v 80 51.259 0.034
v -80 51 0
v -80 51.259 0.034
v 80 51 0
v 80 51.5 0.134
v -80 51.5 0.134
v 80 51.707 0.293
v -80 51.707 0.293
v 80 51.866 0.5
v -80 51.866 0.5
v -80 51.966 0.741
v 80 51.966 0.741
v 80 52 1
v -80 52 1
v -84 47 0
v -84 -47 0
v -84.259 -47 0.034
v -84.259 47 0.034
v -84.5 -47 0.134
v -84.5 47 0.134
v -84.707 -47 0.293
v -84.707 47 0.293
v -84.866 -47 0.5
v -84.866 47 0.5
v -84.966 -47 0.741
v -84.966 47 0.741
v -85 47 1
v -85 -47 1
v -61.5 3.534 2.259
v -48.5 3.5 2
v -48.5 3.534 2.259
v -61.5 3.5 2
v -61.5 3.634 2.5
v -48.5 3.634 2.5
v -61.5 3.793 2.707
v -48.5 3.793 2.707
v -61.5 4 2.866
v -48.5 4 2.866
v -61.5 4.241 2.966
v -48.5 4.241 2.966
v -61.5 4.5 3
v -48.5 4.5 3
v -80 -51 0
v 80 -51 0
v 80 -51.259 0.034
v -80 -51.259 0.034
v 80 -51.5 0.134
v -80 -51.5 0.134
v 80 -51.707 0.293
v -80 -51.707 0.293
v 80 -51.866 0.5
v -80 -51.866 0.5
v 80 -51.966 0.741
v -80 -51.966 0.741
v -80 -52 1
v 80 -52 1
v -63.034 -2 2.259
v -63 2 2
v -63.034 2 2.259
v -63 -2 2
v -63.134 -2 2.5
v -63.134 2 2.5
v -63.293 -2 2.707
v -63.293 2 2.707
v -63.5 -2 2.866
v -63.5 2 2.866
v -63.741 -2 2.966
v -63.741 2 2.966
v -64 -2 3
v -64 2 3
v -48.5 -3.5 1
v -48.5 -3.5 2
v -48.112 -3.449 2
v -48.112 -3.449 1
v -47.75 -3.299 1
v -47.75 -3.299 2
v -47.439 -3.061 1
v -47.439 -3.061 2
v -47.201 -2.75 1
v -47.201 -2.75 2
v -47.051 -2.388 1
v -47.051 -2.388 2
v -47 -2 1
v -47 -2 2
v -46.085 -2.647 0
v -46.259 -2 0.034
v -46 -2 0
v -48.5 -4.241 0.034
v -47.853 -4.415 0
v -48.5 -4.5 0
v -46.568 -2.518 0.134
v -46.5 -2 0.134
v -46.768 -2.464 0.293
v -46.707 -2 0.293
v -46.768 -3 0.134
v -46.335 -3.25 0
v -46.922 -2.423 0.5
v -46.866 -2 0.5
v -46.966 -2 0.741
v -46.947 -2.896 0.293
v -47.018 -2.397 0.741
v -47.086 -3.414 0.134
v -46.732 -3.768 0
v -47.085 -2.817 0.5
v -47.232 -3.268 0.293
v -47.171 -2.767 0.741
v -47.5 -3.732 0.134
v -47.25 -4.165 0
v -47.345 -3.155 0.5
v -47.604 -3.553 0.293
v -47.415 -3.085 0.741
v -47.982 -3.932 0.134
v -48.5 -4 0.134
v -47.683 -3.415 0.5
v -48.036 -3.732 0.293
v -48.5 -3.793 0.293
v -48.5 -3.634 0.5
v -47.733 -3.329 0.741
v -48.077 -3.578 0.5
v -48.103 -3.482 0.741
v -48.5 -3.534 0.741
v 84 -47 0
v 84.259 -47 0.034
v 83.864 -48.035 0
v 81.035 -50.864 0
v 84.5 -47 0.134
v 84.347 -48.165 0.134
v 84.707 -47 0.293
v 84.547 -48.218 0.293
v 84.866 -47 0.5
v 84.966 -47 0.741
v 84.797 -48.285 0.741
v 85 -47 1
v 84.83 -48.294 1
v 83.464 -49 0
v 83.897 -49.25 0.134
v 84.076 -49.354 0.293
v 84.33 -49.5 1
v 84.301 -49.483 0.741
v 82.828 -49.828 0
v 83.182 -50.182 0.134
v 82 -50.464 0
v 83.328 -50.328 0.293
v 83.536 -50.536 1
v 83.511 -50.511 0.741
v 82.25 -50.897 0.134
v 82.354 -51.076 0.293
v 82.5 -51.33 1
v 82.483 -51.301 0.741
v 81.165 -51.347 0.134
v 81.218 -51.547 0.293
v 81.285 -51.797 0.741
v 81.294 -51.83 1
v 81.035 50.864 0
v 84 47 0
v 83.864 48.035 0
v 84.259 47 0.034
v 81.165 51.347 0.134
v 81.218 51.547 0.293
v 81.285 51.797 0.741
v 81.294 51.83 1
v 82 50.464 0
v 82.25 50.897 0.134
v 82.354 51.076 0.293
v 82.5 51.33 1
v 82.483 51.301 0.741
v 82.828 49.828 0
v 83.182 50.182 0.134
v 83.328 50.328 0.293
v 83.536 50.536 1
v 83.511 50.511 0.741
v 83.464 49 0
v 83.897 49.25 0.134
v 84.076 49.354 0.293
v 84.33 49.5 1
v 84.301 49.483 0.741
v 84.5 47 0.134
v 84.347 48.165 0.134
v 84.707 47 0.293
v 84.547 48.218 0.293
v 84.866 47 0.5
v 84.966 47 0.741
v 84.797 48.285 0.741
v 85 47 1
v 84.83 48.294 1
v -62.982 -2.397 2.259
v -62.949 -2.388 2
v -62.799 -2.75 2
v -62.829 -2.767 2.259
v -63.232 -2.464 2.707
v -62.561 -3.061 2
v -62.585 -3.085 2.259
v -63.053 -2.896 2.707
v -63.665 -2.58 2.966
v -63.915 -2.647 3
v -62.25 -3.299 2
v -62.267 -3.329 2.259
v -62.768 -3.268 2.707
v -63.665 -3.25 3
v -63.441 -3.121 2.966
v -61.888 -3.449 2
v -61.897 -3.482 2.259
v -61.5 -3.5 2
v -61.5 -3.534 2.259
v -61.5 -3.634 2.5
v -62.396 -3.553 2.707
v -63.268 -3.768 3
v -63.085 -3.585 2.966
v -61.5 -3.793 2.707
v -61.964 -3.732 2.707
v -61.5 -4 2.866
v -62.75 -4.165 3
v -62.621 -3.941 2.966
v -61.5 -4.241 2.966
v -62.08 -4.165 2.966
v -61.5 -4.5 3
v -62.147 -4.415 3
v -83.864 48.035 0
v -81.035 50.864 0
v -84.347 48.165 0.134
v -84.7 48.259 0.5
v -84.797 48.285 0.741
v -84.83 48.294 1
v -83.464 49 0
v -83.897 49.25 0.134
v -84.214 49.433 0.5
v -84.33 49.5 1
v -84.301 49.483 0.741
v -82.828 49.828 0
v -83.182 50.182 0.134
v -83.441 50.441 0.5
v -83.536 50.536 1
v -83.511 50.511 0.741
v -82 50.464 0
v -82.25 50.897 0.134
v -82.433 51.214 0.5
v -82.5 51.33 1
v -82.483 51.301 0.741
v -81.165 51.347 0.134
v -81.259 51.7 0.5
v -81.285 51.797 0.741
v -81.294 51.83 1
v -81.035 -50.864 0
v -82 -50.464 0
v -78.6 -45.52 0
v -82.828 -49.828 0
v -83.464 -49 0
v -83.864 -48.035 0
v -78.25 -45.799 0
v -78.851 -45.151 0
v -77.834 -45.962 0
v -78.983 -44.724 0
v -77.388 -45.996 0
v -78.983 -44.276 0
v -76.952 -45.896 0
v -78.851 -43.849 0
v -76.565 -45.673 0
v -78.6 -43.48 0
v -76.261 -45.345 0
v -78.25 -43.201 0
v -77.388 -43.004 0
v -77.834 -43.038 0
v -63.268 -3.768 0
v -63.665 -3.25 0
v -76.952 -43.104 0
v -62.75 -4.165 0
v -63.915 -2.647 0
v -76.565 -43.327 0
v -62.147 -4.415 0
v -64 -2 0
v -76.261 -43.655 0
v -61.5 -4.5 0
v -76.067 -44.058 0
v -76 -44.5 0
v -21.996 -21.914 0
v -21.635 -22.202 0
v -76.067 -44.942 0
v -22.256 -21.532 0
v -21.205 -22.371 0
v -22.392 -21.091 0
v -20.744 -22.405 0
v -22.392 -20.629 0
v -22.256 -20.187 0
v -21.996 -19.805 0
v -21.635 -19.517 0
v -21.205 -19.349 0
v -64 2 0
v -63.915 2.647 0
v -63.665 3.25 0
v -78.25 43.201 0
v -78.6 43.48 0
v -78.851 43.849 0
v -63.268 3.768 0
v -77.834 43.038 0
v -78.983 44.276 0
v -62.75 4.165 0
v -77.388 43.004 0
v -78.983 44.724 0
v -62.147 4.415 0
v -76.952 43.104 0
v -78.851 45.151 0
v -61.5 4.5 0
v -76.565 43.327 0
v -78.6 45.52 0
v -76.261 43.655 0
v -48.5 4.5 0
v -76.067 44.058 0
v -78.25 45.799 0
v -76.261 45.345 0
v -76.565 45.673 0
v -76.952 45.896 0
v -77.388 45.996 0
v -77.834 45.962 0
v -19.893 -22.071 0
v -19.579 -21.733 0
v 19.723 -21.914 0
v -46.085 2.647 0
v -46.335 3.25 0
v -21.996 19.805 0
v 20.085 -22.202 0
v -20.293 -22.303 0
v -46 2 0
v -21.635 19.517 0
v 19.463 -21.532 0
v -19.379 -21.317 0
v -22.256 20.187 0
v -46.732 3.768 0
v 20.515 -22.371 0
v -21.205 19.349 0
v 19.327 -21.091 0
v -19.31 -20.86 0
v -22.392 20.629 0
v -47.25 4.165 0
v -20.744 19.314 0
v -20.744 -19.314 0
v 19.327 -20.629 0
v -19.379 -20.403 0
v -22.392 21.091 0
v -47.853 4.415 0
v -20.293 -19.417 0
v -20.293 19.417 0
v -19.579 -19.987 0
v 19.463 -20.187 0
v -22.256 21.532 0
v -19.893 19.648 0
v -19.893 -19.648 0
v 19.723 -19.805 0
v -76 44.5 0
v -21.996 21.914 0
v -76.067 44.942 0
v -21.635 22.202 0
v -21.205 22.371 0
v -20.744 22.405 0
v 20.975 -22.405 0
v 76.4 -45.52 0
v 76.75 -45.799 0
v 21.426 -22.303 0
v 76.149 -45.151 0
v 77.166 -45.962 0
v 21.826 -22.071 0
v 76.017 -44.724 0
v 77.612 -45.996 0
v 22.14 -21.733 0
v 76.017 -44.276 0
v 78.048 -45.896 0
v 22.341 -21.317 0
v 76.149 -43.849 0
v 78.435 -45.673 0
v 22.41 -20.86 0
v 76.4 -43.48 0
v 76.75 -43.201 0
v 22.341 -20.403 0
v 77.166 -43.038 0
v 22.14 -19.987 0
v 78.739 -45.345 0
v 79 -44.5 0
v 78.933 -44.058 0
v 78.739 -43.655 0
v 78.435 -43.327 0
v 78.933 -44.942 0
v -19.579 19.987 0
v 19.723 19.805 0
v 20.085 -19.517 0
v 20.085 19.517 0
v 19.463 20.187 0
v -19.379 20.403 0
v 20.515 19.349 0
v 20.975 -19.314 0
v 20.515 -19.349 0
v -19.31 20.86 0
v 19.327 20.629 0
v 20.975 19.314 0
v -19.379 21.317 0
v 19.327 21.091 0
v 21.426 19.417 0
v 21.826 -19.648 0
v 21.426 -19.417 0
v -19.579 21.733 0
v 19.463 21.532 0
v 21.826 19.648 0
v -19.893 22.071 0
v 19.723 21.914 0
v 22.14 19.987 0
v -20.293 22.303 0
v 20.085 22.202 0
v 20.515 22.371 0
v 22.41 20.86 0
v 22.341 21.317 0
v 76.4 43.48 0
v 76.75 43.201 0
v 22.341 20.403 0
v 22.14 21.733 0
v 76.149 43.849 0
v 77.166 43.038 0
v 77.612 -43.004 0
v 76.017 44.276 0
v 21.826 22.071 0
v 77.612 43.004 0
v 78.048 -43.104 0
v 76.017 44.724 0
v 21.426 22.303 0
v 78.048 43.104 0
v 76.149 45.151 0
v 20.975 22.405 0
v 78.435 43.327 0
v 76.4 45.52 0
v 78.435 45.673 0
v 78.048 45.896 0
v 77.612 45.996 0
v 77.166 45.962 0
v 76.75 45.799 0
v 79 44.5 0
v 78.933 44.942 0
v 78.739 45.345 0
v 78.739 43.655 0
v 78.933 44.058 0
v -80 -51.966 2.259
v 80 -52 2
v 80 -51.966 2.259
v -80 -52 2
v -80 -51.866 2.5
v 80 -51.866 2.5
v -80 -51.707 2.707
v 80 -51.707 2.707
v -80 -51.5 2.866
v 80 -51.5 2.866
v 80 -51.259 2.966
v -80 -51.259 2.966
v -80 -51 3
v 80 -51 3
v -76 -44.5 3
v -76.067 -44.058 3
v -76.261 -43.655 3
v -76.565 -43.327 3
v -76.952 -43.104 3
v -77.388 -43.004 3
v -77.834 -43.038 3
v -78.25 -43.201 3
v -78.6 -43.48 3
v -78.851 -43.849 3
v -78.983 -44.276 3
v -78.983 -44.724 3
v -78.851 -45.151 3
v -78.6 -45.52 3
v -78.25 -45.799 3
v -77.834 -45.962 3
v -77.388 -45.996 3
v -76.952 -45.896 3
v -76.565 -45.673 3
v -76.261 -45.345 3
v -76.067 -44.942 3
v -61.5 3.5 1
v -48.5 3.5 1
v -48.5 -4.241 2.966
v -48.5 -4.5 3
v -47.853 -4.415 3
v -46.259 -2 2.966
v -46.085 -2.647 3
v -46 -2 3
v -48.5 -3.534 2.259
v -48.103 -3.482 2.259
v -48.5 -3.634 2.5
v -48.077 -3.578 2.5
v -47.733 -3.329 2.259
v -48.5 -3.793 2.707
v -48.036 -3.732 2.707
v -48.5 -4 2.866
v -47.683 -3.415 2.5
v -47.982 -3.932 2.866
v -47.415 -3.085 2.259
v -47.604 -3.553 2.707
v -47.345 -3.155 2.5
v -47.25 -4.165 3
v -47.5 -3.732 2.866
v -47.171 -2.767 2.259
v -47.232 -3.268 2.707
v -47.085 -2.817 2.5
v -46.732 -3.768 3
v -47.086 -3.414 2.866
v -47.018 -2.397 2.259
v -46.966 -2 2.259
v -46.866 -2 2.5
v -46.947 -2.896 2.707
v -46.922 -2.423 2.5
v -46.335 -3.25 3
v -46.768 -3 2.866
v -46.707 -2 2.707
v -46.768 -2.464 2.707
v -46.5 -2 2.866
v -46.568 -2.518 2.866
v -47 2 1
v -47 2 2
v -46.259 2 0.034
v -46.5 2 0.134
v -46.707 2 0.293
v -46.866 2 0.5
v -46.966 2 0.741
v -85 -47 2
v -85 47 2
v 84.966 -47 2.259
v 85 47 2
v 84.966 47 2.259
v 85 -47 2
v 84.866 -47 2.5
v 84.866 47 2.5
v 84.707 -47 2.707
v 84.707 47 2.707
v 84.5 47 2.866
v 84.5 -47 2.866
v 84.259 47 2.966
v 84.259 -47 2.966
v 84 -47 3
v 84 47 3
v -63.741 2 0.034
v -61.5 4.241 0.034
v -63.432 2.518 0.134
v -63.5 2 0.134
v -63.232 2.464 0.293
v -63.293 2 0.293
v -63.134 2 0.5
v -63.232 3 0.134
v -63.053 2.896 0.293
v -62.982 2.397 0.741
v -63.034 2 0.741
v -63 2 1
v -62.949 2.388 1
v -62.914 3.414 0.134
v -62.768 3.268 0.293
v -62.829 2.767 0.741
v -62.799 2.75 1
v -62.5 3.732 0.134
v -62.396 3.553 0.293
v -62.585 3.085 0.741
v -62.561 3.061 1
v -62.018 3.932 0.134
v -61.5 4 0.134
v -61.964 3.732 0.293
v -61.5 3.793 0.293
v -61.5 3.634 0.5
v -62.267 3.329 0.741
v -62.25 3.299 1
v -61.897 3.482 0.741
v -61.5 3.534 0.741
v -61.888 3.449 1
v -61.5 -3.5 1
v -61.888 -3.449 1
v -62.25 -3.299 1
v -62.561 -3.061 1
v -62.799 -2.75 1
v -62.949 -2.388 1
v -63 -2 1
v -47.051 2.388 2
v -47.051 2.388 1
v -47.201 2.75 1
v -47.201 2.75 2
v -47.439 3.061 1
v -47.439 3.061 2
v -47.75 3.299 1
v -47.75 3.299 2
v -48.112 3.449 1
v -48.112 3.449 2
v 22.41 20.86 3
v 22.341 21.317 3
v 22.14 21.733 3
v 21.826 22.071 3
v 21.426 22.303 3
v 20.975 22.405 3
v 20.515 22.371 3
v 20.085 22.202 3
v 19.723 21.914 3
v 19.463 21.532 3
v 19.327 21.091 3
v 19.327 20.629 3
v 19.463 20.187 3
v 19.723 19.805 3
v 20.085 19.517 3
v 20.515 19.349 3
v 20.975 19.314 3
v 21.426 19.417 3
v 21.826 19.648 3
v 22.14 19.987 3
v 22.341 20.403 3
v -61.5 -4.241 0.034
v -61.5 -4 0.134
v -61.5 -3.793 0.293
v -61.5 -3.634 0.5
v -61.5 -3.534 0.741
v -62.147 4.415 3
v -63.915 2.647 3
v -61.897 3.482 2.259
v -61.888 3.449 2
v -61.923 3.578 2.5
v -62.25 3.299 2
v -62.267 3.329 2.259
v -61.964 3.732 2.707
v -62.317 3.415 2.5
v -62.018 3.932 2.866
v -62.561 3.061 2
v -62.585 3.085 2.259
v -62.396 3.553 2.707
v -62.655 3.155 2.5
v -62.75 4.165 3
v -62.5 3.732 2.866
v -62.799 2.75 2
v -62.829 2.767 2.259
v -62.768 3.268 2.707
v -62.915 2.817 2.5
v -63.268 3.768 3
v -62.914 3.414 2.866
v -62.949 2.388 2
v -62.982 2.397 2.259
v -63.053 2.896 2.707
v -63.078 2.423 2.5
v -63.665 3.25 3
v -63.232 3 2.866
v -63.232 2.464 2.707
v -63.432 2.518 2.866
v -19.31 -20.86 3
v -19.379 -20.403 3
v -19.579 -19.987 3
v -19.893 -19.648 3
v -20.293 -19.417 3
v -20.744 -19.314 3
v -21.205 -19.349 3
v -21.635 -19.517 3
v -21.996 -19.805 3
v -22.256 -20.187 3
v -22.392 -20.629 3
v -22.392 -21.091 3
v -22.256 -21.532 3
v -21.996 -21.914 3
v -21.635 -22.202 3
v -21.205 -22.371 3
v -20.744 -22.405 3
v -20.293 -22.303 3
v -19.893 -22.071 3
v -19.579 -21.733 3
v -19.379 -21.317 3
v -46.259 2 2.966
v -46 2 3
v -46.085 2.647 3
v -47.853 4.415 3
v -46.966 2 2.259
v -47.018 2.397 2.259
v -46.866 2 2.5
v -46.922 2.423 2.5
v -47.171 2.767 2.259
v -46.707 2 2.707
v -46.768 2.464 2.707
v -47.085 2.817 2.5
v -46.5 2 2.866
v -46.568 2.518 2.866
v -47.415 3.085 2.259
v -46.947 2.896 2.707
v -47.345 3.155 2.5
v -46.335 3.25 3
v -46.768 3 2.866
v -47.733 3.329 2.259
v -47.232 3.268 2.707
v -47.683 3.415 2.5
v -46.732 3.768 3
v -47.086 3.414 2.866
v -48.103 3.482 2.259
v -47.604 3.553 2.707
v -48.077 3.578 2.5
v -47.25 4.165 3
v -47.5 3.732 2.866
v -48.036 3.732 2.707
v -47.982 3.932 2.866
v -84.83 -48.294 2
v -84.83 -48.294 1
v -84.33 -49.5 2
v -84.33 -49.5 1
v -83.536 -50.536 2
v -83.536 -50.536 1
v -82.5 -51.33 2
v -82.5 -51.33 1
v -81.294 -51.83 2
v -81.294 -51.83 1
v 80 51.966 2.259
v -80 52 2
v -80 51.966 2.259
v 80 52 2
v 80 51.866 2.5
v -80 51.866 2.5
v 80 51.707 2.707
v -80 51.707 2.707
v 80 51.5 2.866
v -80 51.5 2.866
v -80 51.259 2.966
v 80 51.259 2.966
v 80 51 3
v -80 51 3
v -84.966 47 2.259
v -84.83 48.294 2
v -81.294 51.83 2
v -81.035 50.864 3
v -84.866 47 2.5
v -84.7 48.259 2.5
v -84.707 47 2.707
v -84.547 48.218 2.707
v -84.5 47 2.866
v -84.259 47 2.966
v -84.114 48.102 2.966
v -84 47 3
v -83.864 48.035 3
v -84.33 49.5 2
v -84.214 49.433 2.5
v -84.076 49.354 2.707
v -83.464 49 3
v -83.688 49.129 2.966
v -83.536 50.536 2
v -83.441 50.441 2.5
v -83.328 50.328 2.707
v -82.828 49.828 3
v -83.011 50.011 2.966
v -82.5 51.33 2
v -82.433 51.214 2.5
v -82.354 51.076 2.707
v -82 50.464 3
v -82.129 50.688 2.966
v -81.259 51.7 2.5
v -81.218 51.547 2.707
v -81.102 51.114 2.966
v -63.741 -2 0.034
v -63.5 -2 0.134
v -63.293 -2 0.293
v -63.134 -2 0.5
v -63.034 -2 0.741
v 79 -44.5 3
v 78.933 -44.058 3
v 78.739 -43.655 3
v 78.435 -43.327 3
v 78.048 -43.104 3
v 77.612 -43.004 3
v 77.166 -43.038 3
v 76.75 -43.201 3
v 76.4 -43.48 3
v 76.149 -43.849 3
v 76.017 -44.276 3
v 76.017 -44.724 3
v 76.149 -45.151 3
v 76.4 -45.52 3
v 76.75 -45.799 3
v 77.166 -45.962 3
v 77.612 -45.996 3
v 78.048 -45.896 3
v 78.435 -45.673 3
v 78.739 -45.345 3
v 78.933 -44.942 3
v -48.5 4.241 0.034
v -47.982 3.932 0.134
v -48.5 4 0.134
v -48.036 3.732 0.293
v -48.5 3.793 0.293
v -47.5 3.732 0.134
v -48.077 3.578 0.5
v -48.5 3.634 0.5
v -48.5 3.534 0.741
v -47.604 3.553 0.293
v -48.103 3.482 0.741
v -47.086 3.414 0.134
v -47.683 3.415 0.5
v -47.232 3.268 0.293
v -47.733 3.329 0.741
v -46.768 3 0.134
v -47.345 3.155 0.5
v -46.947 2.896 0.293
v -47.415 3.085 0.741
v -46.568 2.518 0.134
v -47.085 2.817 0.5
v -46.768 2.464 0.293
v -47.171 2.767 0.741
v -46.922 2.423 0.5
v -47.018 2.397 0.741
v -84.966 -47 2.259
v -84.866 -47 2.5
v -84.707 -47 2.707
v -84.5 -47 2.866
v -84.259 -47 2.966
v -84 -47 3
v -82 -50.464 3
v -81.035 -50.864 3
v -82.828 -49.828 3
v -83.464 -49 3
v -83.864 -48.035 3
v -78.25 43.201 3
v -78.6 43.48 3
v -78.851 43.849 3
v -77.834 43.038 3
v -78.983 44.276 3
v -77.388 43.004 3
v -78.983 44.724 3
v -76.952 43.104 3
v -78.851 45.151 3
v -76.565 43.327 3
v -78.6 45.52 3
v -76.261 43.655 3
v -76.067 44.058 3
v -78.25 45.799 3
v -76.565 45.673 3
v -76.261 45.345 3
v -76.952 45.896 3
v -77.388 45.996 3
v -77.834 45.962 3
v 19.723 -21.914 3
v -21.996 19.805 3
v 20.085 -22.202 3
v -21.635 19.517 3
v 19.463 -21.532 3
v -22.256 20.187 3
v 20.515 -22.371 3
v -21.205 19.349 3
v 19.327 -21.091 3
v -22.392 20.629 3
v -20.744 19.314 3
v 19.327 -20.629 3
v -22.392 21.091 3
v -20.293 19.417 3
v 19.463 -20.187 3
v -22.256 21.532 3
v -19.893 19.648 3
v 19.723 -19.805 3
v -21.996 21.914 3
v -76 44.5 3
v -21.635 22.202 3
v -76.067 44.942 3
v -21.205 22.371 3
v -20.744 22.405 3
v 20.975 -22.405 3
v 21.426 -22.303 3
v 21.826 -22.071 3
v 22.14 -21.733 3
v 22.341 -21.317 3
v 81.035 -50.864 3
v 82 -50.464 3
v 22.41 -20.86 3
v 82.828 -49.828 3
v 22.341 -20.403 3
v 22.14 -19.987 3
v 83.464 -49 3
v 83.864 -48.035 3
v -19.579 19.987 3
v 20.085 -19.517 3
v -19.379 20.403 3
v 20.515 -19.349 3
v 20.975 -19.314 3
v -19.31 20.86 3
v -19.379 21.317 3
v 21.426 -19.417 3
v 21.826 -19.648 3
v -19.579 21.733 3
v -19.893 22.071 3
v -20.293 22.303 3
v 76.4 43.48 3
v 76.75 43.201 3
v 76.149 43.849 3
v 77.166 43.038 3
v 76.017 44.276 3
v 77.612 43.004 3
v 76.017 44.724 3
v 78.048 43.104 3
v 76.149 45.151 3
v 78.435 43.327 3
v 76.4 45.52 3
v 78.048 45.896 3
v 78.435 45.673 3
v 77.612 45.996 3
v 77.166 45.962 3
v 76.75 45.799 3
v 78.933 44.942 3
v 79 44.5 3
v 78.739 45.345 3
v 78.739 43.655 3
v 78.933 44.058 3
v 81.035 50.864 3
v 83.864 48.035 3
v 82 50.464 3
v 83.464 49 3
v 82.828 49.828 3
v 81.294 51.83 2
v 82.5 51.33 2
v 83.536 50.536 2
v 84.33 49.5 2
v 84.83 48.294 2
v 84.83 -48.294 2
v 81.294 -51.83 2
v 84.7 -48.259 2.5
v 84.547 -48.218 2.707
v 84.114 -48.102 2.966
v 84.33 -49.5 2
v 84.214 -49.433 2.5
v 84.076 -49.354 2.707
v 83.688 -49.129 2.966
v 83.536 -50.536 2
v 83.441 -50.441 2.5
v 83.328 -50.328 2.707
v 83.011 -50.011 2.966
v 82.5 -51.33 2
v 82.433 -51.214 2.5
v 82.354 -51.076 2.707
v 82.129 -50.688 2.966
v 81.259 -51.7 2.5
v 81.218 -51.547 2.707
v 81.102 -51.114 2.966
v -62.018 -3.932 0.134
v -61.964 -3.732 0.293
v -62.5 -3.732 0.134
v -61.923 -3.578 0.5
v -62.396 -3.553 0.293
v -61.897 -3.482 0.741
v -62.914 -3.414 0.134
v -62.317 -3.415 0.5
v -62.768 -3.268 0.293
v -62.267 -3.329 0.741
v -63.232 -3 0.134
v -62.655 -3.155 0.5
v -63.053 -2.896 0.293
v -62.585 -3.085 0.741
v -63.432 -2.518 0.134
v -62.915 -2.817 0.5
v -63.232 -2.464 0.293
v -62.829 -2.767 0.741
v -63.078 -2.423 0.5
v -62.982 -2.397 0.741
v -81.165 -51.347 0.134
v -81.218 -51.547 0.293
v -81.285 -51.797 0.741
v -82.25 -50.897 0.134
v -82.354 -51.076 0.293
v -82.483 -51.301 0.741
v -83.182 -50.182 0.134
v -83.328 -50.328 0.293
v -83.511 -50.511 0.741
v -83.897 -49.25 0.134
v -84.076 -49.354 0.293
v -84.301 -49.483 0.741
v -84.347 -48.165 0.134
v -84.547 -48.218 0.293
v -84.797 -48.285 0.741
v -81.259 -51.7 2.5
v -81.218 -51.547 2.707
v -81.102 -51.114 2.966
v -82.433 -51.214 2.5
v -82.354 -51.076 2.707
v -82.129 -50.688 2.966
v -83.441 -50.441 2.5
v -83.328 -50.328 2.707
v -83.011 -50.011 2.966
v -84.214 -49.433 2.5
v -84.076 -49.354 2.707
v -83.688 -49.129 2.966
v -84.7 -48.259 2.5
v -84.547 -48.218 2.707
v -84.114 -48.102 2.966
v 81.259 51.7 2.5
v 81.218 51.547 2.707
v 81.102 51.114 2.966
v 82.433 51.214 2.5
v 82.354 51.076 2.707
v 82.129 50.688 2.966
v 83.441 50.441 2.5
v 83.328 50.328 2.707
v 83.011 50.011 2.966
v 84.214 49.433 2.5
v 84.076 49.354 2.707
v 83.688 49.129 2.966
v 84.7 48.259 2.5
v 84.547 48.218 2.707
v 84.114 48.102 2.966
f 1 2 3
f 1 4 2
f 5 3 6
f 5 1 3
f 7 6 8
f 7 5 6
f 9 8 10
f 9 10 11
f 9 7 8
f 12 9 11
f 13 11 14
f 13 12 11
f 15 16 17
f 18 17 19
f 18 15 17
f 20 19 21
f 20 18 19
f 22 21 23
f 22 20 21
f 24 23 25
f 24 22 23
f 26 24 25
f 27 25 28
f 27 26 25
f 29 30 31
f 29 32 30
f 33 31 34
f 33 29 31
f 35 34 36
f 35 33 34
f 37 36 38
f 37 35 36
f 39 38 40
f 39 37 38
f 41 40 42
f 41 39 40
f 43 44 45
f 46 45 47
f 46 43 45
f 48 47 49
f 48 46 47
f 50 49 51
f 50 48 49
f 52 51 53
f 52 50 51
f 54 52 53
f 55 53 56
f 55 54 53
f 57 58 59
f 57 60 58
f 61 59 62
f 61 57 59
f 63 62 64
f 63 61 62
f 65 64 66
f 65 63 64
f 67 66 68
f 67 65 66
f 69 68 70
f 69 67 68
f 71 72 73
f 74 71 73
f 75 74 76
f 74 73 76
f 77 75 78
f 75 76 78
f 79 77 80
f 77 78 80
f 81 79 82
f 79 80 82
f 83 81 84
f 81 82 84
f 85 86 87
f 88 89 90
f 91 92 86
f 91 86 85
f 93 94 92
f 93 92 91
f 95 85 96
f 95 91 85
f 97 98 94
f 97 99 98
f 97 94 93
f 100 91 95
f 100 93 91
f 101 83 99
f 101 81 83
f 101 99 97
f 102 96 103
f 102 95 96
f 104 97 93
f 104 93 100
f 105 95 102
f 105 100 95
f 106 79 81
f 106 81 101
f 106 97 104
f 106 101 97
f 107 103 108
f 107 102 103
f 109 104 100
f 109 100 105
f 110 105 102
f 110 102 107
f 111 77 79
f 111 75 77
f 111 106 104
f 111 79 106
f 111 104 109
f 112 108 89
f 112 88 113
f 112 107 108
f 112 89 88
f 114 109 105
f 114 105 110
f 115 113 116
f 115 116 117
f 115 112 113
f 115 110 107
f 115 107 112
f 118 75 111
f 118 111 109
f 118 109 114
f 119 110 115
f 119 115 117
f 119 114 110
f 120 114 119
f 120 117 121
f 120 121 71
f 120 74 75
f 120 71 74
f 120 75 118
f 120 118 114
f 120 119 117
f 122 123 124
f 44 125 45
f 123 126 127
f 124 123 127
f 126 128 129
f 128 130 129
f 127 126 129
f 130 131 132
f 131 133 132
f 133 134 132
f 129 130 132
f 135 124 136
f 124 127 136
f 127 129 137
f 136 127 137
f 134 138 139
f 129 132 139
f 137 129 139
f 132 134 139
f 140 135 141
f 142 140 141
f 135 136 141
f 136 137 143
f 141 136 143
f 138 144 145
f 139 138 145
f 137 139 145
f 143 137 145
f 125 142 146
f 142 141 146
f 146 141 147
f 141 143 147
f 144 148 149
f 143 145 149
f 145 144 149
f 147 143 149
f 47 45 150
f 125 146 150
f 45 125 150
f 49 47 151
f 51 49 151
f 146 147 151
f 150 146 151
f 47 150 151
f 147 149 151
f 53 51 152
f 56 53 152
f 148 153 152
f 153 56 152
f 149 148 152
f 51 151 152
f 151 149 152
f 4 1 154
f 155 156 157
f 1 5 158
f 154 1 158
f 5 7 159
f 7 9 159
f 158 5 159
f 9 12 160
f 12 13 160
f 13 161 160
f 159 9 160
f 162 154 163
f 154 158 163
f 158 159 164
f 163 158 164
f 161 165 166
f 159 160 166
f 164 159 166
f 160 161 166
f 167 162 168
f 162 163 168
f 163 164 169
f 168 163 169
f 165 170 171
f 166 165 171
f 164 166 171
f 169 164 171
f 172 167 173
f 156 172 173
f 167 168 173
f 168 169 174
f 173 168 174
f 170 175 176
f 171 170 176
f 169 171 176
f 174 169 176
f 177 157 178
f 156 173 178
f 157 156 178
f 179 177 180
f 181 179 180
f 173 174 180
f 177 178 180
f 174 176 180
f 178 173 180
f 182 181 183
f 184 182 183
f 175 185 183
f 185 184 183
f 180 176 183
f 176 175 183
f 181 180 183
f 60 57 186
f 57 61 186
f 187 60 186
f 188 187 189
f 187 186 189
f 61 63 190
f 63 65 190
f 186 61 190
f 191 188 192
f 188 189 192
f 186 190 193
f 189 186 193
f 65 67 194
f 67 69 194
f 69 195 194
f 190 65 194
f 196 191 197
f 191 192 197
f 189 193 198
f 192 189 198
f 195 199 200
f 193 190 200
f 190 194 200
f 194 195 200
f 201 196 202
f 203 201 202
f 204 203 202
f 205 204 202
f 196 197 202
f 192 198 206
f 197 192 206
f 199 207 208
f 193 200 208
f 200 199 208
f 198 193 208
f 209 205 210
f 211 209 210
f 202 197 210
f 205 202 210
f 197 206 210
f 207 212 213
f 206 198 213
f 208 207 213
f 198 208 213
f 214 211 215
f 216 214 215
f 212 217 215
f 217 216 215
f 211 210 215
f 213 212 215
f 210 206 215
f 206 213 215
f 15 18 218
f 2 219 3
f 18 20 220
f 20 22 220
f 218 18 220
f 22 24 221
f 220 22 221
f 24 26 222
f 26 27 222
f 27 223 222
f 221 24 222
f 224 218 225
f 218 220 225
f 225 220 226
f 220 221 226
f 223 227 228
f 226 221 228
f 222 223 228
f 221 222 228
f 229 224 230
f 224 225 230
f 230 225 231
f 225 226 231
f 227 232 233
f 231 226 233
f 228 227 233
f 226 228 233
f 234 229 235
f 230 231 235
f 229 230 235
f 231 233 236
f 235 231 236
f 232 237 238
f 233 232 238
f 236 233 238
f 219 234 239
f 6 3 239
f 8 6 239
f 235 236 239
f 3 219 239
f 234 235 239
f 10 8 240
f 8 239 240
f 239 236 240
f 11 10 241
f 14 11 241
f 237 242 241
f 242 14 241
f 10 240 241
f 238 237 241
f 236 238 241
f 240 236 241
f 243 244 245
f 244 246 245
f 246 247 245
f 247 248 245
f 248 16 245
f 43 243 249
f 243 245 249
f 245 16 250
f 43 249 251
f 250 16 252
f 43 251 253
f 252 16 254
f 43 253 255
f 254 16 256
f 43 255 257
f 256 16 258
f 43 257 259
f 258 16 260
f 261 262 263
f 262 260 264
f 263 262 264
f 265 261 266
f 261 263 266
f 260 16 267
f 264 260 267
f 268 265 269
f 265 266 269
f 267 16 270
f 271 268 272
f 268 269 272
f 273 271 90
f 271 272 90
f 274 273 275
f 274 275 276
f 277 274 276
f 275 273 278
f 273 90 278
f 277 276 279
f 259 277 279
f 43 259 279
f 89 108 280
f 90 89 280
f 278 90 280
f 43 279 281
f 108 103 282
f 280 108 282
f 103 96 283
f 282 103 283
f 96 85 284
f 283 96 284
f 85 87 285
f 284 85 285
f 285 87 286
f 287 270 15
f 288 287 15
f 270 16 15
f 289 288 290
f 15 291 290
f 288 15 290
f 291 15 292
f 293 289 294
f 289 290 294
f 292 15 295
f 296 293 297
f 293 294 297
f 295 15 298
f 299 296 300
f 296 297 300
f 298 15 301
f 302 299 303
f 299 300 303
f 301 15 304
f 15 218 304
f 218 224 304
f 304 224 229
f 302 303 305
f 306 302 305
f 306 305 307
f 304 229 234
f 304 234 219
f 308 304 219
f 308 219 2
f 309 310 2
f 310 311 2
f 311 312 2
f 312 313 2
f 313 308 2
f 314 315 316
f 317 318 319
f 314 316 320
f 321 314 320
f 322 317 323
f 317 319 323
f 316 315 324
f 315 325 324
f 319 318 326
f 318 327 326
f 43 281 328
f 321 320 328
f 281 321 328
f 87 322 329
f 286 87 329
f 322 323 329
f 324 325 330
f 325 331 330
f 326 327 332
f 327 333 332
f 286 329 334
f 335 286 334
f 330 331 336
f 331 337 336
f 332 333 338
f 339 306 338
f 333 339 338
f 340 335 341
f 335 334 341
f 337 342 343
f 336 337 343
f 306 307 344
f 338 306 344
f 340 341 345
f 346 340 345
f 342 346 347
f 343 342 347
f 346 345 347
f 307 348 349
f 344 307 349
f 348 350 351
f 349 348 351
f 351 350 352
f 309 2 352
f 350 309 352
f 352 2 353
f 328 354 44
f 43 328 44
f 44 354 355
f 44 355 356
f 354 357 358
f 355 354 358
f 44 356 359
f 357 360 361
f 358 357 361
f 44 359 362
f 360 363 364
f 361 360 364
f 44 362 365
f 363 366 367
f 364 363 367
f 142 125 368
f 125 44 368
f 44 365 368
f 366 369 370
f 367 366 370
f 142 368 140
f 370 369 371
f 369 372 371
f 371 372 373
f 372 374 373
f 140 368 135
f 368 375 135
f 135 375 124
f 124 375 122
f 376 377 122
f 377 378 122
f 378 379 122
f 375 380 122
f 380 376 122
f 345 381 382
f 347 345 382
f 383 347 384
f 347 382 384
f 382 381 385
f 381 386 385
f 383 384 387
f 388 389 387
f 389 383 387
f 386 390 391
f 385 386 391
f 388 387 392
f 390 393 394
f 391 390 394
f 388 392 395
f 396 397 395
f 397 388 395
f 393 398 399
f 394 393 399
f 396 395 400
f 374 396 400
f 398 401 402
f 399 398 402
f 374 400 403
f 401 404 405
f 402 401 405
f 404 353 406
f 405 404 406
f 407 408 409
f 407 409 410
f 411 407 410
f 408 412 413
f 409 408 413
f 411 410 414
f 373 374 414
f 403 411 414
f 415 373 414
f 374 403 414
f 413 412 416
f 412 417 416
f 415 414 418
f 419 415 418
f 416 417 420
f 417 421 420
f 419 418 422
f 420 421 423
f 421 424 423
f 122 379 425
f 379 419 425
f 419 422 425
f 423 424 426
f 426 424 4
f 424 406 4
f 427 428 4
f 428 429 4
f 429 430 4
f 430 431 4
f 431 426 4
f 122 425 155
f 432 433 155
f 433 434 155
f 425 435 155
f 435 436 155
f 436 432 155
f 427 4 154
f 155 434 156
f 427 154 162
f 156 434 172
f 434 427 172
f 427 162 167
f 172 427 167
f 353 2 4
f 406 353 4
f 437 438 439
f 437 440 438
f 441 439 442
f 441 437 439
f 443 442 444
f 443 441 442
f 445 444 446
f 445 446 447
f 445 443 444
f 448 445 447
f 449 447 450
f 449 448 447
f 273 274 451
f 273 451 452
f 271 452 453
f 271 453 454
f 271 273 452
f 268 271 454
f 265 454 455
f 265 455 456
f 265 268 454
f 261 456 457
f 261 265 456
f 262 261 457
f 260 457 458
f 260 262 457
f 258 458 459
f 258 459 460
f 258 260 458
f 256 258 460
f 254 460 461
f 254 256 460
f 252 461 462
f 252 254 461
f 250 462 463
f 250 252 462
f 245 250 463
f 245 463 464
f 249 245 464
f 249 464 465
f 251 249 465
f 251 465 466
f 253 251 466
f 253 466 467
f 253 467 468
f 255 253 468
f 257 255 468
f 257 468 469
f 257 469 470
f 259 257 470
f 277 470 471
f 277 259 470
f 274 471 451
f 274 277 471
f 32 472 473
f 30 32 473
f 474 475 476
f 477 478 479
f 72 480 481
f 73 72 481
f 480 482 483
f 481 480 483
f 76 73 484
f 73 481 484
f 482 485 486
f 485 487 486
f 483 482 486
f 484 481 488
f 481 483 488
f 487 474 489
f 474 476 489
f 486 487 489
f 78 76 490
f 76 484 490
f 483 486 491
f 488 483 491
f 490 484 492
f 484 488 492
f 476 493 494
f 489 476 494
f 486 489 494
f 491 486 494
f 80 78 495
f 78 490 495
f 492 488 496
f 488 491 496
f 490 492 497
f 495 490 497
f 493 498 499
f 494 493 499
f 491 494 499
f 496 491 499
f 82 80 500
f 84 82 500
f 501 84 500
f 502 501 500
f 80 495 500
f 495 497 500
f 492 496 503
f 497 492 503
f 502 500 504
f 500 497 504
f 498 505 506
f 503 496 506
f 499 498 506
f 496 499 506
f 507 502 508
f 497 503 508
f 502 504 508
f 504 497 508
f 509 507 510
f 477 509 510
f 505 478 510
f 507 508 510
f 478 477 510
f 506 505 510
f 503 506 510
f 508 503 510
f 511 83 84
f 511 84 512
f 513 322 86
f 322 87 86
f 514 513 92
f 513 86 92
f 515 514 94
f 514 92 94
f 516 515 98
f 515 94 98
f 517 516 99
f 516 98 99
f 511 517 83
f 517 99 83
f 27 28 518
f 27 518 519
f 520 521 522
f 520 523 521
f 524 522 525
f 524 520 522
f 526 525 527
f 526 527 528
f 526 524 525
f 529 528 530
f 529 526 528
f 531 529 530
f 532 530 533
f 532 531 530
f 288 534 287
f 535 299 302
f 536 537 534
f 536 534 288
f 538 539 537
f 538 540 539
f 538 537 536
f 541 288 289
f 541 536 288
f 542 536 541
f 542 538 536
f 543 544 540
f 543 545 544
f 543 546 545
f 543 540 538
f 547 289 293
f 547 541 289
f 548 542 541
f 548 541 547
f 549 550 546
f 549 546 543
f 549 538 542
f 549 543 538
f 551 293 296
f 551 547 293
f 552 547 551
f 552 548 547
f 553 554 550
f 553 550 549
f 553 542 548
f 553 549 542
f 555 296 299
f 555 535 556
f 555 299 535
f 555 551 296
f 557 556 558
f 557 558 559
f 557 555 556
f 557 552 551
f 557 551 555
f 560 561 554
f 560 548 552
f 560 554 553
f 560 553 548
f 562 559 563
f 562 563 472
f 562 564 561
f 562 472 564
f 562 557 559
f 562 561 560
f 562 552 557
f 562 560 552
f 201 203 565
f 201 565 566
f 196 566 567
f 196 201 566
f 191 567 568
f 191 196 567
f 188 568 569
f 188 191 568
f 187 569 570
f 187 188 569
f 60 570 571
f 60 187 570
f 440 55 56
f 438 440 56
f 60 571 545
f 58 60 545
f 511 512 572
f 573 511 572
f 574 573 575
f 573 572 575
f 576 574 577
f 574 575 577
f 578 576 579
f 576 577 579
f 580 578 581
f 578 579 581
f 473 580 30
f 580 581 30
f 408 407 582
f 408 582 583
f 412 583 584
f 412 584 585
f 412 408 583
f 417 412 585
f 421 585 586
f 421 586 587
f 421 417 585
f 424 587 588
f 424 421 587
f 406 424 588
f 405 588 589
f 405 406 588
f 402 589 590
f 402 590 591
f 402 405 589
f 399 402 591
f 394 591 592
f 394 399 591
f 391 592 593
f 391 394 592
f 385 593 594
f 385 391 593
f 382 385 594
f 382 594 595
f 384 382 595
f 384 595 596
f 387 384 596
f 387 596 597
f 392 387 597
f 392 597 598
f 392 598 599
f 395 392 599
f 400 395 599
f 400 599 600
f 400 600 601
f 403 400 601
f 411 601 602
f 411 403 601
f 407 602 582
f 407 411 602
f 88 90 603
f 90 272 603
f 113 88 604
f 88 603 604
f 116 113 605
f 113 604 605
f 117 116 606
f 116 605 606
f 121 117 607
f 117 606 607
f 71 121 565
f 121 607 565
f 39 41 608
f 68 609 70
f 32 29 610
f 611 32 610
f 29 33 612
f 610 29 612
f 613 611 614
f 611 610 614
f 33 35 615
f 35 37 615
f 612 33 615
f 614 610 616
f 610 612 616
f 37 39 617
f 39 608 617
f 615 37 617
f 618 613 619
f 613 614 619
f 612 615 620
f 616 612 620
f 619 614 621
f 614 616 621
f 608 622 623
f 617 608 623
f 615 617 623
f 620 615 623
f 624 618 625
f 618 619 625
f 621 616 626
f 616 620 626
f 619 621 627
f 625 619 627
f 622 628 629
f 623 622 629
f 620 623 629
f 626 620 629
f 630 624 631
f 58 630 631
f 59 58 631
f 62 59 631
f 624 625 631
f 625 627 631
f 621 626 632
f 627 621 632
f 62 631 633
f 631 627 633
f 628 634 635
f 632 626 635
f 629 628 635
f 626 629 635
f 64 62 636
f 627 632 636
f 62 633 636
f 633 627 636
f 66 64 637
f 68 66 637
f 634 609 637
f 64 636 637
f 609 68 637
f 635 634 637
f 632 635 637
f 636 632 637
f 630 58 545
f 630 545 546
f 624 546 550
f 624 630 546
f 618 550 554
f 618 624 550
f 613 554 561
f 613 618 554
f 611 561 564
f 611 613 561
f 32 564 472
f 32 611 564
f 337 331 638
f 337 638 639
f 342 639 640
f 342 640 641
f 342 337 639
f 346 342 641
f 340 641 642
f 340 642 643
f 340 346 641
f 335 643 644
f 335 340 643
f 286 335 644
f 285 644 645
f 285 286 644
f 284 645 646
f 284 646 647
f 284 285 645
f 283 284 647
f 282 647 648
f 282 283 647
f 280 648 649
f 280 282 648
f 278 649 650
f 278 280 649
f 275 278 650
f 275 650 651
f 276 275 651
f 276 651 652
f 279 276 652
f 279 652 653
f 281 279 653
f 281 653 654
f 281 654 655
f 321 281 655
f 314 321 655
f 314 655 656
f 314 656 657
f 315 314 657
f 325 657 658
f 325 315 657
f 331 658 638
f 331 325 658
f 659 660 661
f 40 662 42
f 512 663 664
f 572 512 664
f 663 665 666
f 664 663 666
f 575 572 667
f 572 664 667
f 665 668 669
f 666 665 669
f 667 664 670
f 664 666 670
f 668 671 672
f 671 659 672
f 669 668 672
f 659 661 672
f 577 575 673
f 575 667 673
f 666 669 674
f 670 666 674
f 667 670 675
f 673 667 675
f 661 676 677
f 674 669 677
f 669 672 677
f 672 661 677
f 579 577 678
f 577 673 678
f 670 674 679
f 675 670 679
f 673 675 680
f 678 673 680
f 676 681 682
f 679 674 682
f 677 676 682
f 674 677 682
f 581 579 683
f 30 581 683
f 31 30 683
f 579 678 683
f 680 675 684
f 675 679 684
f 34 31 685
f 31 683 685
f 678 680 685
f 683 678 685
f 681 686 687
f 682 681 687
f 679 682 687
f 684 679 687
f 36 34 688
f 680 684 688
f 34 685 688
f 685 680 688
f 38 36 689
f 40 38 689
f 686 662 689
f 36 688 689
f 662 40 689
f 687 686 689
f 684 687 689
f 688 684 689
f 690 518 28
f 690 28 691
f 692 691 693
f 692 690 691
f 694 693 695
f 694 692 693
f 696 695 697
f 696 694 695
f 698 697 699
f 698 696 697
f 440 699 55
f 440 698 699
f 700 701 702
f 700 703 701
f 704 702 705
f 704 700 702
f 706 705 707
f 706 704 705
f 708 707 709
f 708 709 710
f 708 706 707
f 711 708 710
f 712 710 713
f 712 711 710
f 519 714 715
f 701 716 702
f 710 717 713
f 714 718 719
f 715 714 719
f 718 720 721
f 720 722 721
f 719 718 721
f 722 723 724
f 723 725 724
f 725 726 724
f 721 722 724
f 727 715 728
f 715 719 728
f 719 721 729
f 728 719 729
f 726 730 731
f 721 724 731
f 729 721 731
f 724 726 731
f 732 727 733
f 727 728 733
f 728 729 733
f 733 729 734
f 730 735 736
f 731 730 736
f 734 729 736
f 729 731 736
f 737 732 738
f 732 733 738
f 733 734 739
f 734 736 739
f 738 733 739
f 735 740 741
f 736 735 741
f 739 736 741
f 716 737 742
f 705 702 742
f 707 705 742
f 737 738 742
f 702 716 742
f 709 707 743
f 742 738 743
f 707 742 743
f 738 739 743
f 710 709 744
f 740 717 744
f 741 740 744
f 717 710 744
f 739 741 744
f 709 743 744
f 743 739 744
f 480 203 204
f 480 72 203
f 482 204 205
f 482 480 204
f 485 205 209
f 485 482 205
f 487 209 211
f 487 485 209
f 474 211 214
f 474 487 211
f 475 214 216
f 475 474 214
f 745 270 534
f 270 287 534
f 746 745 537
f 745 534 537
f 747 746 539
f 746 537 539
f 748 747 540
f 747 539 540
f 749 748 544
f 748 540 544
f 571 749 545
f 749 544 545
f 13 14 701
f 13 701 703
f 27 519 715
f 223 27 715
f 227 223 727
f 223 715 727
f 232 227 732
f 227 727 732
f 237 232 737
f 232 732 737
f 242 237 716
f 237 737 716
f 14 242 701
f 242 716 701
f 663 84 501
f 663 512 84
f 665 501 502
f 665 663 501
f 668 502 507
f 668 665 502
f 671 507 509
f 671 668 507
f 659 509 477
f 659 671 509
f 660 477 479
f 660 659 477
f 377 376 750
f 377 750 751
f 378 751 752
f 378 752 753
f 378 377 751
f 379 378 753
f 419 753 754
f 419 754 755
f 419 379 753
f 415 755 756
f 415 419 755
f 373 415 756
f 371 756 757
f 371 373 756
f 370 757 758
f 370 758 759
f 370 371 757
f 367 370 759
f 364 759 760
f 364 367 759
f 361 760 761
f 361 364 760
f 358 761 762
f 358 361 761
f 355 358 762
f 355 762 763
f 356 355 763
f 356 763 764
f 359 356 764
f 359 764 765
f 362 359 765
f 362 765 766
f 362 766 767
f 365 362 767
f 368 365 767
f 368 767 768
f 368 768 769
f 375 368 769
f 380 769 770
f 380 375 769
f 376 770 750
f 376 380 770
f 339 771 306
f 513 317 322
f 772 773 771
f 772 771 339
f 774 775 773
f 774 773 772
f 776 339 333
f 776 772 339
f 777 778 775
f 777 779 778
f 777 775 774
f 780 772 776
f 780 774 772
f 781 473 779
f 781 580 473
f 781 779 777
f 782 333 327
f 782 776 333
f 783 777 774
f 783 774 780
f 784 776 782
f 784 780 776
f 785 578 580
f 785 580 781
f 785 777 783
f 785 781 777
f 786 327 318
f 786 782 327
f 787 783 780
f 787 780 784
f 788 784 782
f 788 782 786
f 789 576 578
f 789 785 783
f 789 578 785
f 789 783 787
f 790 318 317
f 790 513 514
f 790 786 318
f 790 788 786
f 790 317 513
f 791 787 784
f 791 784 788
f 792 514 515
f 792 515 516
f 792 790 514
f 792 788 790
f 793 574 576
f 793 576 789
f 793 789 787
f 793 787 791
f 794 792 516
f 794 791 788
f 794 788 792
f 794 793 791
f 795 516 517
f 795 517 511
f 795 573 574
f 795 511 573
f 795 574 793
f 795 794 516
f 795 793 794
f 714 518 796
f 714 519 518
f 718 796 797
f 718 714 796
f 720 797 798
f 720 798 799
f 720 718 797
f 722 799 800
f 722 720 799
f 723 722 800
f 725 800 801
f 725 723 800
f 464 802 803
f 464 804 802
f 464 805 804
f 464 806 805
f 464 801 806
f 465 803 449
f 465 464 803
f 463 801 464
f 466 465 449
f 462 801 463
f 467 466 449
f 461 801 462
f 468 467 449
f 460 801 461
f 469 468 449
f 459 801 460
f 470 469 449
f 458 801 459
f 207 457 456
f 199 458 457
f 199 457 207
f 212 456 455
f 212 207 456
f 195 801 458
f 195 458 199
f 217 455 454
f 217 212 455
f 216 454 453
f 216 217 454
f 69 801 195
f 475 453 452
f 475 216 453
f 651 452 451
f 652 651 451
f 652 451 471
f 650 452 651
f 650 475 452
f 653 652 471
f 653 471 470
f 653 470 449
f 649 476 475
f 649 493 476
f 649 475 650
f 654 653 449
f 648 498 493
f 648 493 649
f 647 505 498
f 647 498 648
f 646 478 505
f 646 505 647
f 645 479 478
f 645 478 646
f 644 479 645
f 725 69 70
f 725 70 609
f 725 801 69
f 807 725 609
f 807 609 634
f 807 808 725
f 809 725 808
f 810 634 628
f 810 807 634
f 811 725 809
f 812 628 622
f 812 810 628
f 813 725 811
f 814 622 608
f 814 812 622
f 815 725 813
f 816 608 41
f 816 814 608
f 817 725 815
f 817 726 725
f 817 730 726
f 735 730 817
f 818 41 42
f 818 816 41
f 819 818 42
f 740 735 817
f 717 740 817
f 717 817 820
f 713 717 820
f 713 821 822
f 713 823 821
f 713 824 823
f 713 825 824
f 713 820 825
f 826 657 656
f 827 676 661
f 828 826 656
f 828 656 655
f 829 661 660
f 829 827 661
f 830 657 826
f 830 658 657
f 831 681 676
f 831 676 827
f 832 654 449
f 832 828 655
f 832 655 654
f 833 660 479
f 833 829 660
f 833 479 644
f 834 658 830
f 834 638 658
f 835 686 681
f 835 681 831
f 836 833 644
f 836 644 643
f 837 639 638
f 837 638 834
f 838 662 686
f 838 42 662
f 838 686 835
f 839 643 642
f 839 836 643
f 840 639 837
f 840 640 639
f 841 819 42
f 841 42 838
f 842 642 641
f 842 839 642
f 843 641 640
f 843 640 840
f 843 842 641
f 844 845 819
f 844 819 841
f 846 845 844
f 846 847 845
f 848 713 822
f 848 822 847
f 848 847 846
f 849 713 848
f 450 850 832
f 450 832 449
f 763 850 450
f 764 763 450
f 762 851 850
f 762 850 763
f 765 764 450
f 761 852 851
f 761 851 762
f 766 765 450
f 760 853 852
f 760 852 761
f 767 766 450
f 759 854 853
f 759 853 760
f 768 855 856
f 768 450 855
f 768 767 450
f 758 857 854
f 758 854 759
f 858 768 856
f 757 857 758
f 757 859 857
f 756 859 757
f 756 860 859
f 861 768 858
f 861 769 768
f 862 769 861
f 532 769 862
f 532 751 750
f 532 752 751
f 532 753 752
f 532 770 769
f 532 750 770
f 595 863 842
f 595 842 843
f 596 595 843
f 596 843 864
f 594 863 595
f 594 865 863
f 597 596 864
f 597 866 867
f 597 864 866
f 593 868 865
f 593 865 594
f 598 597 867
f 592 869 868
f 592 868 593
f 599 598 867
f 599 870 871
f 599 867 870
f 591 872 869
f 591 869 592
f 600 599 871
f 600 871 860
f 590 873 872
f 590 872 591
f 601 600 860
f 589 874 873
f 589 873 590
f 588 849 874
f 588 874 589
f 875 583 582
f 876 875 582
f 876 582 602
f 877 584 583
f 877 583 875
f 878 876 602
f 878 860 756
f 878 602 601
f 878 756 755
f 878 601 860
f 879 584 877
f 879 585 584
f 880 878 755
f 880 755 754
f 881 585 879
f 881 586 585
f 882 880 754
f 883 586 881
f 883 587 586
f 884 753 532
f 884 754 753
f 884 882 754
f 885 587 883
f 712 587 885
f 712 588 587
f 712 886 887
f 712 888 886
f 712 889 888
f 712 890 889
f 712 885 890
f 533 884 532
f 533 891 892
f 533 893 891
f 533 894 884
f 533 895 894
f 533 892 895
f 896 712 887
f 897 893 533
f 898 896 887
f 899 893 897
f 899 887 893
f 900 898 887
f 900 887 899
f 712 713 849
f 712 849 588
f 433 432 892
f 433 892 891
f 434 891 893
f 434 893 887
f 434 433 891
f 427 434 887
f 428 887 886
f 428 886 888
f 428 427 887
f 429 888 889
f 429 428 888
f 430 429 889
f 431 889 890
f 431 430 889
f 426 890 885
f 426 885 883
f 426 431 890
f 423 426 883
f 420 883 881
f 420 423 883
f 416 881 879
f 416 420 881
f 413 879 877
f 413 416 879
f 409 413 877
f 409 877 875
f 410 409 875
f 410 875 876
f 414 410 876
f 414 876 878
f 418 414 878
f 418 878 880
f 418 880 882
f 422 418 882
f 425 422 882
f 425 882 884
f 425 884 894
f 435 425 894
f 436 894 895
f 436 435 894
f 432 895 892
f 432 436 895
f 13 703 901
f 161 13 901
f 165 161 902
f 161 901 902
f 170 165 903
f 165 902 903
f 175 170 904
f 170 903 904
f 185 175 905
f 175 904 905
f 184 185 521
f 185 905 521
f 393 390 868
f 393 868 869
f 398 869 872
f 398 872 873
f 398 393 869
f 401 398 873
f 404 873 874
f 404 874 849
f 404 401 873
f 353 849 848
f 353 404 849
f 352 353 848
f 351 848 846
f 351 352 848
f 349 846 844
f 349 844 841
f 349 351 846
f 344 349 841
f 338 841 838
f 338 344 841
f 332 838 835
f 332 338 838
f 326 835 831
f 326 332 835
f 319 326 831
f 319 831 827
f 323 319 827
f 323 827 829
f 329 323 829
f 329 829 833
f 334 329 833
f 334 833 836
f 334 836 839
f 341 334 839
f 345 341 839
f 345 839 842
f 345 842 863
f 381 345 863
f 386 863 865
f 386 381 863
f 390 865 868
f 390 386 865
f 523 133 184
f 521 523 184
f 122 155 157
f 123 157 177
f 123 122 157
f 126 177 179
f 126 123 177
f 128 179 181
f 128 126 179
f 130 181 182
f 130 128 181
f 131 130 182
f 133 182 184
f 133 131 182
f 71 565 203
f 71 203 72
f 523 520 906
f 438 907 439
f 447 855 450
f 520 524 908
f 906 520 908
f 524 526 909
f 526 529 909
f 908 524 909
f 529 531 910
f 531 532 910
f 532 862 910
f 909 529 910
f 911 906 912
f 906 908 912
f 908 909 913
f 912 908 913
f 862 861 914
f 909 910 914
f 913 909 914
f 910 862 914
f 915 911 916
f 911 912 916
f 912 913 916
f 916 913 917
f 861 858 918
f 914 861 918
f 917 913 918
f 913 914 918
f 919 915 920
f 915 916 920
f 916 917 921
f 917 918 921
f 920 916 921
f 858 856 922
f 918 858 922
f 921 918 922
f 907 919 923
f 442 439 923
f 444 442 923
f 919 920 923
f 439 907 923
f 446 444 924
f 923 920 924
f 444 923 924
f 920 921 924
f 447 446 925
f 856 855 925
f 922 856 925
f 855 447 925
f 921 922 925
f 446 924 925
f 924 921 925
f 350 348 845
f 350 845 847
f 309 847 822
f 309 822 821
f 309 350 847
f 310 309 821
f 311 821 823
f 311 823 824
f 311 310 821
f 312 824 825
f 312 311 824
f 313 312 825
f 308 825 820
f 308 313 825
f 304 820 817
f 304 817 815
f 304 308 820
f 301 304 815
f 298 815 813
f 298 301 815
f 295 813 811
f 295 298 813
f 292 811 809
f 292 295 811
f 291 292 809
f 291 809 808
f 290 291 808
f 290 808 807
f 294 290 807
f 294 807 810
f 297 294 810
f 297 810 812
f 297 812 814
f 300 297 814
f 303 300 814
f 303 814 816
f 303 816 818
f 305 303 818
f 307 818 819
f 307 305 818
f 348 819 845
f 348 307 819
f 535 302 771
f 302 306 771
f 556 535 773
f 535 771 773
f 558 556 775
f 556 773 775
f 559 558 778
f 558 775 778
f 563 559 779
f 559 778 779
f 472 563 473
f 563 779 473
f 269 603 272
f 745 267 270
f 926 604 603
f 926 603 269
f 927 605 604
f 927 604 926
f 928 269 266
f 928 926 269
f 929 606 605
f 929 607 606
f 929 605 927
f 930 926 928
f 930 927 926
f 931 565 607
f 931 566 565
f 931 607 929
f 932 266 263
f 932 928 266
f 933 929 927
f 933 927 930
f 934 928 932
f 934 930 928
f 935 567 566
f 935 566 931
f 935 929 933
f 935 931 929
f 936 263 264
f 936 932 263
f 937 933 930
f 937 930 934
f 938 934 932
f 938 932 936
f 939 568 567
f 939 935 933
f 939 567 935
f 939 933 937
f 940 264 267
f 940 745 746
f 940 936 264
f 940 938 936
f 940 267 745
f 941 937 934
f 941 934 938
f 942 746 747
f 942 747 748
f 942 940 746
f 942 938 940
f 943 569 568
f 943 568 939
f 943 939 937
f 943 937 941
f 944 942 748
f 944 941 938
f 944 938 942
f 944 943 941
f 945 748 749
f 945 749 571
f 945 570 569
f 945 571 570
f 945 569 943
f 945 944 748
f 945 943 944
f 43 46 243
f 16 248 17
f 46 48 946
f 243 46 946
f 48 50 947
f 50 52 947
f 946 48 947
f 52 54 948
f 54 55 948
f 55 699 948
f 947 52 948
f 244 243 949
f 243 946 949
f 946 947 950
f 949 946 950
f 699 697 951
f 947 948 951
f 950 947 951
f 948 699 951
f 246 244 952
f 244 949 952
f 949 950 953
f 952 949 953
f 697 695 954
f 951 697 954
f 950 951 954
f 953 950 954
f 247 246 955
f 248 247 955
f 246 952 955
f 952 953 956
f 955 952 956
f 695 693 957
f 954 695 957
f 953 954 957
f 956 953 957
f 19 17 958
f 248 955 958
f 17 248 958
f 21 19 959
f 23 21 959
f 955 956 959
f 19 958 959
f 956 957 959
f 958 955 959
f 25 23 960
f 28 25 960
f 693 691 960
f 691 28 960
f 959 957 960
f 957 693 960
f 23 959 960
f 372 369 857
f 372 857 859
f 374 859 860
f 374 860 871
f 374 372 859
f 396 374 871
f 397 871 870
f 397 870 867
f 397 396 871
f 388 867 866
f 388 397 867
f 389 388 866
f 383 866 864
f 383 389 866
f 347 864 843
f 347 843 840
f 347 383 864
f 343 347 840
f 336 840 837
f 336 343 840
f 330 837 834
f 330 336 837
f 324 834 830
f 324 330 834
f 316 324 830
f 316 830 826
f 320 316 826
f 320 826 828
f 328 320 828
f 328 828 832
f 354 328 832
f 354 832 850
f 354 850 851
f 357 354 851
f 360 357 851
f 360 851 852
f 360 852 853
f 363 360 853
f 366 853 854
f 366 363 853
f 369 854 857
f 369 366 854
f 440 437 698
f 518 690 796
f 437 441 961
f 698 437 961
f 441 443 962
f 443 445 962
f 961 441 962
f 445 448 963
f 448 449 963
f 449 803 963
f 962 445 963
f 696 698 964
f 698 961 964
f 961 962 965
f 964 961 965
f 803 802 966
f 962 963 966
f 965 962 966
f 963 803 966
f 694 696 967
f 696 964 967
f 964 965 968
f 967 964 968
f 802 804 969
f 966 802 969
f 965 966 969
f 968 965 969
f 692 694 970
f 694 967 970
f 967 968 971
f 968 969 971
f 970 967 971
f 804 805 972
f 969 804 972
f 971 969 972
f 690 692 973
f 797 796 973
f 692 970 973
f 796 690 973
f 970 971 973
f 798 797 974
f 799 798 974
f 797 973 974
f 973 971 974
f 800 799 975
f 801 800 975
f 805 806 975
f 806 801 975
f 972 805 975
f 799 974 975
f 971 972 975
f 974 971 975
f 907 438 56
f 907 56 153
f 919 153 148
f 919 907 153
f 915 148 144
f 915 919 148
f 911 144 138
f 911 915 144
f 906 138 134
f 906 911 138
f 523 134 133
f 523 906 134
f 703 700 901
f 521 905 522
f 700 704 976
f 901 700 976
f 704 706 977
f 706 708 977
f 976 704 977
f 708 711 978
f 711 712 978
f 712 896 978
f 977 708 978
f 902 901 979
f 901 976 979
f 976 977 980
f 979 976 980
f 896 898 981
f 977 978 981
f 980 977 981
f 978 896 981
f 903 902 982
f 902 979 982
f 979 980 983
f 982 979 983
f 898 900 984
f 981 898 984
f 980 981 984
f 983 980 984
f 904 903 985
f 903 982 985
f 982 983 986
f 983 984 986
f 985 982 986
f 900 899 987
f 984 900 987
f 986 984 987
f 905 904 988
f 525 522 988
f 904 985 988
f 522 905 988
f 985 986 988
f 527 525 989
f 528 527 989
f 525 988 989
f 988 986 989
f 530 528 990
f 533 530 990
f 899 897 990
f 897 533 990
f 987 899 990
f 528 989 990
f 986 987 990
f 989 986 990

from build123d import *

# Parameters (mm, degrees)
F0_W     = 170
F0_H     = 104
F0_R     = 1.5
F0_R_2   = 1.55
F0_W_2   = 16
F0_H_2   = 7
F1_DEPTH = 3
F2_R     = 5
F3_R     = 1.5
F4_R     = 1


with BuildPart() as f1:
    # F0 (on Top) → F1 (new body)
    with BuildSketch(Plane.XY):
        Rectangle(F0_W, F0_H)
        with Locations((-77.5, -44.5)):
            Circle(F0_R, mode=Mode.SUBTRACT)
        with Locations((-20.85965, -20.85965)):
            Circle(F0_R_2, mode=Mode.SUBTRACT)
        with Locations((77.5, -44.5)):
            Circle(F0_R, mode=Mode.SUBTRACT)
        with Locations((20.85965, -20.85965)):
            Circle(F0_R_2, mode=Mode.SUBTRACT)
        with Locations((-55, 0)):
            Rectangle(F0_W_2, F0_H_2, mode=Mode.SUBTRACT)
        with Locations((-20.85965, 20.85965)):
            Circle(F0_R_2, mode=Mode.SUBTRACT)
        with Locations((-77.5, 44.5)):
            Circle(F0_R, mode=Mode.SUBTRACT)
        with Locations((20.85965, 20.85965)):
            Circle(F0_R_2, mode=Mode.SUBTRACT)
        with Locations((77.5, 44.5)):
            Circle(F0_R, mode=Mode.SUBTRACT)
    extrude(amount=F1_DEPTH)

    # F2
    f2_edges = [f1.edges().sort_by_distance(p)[0] for p in [
        (-85, -52, 1.5),
        (-85, 52, 1.5),
        (85, 52, 1.5),
        (85, -52, 1.5),
    ]]
    fillet(f2_edges, radius=F2_R)

    # F3
    f3_edges = [f1.edges().sort_by_distance(p)[0] for p in [
        (-47, 3.5, 1.5),
        (-47, -3.5, 1.5),
        (-63, -3.5, 1.5),
        (-63, 3.5, 1.5),
    ]]
    fillet(f3_edges, radius=F3_R)

    # F4
    f4_edges = [f1.edges().sort_by_distance(p)[0] for p in [
        (0, 52, 3),
        (0, 52, 0),
        (-55, -3.5, 3),
        (-55, 3.5, 0),
    ]]
    fillet(f4_edges, radius=F4_R)


solid = f1.part
